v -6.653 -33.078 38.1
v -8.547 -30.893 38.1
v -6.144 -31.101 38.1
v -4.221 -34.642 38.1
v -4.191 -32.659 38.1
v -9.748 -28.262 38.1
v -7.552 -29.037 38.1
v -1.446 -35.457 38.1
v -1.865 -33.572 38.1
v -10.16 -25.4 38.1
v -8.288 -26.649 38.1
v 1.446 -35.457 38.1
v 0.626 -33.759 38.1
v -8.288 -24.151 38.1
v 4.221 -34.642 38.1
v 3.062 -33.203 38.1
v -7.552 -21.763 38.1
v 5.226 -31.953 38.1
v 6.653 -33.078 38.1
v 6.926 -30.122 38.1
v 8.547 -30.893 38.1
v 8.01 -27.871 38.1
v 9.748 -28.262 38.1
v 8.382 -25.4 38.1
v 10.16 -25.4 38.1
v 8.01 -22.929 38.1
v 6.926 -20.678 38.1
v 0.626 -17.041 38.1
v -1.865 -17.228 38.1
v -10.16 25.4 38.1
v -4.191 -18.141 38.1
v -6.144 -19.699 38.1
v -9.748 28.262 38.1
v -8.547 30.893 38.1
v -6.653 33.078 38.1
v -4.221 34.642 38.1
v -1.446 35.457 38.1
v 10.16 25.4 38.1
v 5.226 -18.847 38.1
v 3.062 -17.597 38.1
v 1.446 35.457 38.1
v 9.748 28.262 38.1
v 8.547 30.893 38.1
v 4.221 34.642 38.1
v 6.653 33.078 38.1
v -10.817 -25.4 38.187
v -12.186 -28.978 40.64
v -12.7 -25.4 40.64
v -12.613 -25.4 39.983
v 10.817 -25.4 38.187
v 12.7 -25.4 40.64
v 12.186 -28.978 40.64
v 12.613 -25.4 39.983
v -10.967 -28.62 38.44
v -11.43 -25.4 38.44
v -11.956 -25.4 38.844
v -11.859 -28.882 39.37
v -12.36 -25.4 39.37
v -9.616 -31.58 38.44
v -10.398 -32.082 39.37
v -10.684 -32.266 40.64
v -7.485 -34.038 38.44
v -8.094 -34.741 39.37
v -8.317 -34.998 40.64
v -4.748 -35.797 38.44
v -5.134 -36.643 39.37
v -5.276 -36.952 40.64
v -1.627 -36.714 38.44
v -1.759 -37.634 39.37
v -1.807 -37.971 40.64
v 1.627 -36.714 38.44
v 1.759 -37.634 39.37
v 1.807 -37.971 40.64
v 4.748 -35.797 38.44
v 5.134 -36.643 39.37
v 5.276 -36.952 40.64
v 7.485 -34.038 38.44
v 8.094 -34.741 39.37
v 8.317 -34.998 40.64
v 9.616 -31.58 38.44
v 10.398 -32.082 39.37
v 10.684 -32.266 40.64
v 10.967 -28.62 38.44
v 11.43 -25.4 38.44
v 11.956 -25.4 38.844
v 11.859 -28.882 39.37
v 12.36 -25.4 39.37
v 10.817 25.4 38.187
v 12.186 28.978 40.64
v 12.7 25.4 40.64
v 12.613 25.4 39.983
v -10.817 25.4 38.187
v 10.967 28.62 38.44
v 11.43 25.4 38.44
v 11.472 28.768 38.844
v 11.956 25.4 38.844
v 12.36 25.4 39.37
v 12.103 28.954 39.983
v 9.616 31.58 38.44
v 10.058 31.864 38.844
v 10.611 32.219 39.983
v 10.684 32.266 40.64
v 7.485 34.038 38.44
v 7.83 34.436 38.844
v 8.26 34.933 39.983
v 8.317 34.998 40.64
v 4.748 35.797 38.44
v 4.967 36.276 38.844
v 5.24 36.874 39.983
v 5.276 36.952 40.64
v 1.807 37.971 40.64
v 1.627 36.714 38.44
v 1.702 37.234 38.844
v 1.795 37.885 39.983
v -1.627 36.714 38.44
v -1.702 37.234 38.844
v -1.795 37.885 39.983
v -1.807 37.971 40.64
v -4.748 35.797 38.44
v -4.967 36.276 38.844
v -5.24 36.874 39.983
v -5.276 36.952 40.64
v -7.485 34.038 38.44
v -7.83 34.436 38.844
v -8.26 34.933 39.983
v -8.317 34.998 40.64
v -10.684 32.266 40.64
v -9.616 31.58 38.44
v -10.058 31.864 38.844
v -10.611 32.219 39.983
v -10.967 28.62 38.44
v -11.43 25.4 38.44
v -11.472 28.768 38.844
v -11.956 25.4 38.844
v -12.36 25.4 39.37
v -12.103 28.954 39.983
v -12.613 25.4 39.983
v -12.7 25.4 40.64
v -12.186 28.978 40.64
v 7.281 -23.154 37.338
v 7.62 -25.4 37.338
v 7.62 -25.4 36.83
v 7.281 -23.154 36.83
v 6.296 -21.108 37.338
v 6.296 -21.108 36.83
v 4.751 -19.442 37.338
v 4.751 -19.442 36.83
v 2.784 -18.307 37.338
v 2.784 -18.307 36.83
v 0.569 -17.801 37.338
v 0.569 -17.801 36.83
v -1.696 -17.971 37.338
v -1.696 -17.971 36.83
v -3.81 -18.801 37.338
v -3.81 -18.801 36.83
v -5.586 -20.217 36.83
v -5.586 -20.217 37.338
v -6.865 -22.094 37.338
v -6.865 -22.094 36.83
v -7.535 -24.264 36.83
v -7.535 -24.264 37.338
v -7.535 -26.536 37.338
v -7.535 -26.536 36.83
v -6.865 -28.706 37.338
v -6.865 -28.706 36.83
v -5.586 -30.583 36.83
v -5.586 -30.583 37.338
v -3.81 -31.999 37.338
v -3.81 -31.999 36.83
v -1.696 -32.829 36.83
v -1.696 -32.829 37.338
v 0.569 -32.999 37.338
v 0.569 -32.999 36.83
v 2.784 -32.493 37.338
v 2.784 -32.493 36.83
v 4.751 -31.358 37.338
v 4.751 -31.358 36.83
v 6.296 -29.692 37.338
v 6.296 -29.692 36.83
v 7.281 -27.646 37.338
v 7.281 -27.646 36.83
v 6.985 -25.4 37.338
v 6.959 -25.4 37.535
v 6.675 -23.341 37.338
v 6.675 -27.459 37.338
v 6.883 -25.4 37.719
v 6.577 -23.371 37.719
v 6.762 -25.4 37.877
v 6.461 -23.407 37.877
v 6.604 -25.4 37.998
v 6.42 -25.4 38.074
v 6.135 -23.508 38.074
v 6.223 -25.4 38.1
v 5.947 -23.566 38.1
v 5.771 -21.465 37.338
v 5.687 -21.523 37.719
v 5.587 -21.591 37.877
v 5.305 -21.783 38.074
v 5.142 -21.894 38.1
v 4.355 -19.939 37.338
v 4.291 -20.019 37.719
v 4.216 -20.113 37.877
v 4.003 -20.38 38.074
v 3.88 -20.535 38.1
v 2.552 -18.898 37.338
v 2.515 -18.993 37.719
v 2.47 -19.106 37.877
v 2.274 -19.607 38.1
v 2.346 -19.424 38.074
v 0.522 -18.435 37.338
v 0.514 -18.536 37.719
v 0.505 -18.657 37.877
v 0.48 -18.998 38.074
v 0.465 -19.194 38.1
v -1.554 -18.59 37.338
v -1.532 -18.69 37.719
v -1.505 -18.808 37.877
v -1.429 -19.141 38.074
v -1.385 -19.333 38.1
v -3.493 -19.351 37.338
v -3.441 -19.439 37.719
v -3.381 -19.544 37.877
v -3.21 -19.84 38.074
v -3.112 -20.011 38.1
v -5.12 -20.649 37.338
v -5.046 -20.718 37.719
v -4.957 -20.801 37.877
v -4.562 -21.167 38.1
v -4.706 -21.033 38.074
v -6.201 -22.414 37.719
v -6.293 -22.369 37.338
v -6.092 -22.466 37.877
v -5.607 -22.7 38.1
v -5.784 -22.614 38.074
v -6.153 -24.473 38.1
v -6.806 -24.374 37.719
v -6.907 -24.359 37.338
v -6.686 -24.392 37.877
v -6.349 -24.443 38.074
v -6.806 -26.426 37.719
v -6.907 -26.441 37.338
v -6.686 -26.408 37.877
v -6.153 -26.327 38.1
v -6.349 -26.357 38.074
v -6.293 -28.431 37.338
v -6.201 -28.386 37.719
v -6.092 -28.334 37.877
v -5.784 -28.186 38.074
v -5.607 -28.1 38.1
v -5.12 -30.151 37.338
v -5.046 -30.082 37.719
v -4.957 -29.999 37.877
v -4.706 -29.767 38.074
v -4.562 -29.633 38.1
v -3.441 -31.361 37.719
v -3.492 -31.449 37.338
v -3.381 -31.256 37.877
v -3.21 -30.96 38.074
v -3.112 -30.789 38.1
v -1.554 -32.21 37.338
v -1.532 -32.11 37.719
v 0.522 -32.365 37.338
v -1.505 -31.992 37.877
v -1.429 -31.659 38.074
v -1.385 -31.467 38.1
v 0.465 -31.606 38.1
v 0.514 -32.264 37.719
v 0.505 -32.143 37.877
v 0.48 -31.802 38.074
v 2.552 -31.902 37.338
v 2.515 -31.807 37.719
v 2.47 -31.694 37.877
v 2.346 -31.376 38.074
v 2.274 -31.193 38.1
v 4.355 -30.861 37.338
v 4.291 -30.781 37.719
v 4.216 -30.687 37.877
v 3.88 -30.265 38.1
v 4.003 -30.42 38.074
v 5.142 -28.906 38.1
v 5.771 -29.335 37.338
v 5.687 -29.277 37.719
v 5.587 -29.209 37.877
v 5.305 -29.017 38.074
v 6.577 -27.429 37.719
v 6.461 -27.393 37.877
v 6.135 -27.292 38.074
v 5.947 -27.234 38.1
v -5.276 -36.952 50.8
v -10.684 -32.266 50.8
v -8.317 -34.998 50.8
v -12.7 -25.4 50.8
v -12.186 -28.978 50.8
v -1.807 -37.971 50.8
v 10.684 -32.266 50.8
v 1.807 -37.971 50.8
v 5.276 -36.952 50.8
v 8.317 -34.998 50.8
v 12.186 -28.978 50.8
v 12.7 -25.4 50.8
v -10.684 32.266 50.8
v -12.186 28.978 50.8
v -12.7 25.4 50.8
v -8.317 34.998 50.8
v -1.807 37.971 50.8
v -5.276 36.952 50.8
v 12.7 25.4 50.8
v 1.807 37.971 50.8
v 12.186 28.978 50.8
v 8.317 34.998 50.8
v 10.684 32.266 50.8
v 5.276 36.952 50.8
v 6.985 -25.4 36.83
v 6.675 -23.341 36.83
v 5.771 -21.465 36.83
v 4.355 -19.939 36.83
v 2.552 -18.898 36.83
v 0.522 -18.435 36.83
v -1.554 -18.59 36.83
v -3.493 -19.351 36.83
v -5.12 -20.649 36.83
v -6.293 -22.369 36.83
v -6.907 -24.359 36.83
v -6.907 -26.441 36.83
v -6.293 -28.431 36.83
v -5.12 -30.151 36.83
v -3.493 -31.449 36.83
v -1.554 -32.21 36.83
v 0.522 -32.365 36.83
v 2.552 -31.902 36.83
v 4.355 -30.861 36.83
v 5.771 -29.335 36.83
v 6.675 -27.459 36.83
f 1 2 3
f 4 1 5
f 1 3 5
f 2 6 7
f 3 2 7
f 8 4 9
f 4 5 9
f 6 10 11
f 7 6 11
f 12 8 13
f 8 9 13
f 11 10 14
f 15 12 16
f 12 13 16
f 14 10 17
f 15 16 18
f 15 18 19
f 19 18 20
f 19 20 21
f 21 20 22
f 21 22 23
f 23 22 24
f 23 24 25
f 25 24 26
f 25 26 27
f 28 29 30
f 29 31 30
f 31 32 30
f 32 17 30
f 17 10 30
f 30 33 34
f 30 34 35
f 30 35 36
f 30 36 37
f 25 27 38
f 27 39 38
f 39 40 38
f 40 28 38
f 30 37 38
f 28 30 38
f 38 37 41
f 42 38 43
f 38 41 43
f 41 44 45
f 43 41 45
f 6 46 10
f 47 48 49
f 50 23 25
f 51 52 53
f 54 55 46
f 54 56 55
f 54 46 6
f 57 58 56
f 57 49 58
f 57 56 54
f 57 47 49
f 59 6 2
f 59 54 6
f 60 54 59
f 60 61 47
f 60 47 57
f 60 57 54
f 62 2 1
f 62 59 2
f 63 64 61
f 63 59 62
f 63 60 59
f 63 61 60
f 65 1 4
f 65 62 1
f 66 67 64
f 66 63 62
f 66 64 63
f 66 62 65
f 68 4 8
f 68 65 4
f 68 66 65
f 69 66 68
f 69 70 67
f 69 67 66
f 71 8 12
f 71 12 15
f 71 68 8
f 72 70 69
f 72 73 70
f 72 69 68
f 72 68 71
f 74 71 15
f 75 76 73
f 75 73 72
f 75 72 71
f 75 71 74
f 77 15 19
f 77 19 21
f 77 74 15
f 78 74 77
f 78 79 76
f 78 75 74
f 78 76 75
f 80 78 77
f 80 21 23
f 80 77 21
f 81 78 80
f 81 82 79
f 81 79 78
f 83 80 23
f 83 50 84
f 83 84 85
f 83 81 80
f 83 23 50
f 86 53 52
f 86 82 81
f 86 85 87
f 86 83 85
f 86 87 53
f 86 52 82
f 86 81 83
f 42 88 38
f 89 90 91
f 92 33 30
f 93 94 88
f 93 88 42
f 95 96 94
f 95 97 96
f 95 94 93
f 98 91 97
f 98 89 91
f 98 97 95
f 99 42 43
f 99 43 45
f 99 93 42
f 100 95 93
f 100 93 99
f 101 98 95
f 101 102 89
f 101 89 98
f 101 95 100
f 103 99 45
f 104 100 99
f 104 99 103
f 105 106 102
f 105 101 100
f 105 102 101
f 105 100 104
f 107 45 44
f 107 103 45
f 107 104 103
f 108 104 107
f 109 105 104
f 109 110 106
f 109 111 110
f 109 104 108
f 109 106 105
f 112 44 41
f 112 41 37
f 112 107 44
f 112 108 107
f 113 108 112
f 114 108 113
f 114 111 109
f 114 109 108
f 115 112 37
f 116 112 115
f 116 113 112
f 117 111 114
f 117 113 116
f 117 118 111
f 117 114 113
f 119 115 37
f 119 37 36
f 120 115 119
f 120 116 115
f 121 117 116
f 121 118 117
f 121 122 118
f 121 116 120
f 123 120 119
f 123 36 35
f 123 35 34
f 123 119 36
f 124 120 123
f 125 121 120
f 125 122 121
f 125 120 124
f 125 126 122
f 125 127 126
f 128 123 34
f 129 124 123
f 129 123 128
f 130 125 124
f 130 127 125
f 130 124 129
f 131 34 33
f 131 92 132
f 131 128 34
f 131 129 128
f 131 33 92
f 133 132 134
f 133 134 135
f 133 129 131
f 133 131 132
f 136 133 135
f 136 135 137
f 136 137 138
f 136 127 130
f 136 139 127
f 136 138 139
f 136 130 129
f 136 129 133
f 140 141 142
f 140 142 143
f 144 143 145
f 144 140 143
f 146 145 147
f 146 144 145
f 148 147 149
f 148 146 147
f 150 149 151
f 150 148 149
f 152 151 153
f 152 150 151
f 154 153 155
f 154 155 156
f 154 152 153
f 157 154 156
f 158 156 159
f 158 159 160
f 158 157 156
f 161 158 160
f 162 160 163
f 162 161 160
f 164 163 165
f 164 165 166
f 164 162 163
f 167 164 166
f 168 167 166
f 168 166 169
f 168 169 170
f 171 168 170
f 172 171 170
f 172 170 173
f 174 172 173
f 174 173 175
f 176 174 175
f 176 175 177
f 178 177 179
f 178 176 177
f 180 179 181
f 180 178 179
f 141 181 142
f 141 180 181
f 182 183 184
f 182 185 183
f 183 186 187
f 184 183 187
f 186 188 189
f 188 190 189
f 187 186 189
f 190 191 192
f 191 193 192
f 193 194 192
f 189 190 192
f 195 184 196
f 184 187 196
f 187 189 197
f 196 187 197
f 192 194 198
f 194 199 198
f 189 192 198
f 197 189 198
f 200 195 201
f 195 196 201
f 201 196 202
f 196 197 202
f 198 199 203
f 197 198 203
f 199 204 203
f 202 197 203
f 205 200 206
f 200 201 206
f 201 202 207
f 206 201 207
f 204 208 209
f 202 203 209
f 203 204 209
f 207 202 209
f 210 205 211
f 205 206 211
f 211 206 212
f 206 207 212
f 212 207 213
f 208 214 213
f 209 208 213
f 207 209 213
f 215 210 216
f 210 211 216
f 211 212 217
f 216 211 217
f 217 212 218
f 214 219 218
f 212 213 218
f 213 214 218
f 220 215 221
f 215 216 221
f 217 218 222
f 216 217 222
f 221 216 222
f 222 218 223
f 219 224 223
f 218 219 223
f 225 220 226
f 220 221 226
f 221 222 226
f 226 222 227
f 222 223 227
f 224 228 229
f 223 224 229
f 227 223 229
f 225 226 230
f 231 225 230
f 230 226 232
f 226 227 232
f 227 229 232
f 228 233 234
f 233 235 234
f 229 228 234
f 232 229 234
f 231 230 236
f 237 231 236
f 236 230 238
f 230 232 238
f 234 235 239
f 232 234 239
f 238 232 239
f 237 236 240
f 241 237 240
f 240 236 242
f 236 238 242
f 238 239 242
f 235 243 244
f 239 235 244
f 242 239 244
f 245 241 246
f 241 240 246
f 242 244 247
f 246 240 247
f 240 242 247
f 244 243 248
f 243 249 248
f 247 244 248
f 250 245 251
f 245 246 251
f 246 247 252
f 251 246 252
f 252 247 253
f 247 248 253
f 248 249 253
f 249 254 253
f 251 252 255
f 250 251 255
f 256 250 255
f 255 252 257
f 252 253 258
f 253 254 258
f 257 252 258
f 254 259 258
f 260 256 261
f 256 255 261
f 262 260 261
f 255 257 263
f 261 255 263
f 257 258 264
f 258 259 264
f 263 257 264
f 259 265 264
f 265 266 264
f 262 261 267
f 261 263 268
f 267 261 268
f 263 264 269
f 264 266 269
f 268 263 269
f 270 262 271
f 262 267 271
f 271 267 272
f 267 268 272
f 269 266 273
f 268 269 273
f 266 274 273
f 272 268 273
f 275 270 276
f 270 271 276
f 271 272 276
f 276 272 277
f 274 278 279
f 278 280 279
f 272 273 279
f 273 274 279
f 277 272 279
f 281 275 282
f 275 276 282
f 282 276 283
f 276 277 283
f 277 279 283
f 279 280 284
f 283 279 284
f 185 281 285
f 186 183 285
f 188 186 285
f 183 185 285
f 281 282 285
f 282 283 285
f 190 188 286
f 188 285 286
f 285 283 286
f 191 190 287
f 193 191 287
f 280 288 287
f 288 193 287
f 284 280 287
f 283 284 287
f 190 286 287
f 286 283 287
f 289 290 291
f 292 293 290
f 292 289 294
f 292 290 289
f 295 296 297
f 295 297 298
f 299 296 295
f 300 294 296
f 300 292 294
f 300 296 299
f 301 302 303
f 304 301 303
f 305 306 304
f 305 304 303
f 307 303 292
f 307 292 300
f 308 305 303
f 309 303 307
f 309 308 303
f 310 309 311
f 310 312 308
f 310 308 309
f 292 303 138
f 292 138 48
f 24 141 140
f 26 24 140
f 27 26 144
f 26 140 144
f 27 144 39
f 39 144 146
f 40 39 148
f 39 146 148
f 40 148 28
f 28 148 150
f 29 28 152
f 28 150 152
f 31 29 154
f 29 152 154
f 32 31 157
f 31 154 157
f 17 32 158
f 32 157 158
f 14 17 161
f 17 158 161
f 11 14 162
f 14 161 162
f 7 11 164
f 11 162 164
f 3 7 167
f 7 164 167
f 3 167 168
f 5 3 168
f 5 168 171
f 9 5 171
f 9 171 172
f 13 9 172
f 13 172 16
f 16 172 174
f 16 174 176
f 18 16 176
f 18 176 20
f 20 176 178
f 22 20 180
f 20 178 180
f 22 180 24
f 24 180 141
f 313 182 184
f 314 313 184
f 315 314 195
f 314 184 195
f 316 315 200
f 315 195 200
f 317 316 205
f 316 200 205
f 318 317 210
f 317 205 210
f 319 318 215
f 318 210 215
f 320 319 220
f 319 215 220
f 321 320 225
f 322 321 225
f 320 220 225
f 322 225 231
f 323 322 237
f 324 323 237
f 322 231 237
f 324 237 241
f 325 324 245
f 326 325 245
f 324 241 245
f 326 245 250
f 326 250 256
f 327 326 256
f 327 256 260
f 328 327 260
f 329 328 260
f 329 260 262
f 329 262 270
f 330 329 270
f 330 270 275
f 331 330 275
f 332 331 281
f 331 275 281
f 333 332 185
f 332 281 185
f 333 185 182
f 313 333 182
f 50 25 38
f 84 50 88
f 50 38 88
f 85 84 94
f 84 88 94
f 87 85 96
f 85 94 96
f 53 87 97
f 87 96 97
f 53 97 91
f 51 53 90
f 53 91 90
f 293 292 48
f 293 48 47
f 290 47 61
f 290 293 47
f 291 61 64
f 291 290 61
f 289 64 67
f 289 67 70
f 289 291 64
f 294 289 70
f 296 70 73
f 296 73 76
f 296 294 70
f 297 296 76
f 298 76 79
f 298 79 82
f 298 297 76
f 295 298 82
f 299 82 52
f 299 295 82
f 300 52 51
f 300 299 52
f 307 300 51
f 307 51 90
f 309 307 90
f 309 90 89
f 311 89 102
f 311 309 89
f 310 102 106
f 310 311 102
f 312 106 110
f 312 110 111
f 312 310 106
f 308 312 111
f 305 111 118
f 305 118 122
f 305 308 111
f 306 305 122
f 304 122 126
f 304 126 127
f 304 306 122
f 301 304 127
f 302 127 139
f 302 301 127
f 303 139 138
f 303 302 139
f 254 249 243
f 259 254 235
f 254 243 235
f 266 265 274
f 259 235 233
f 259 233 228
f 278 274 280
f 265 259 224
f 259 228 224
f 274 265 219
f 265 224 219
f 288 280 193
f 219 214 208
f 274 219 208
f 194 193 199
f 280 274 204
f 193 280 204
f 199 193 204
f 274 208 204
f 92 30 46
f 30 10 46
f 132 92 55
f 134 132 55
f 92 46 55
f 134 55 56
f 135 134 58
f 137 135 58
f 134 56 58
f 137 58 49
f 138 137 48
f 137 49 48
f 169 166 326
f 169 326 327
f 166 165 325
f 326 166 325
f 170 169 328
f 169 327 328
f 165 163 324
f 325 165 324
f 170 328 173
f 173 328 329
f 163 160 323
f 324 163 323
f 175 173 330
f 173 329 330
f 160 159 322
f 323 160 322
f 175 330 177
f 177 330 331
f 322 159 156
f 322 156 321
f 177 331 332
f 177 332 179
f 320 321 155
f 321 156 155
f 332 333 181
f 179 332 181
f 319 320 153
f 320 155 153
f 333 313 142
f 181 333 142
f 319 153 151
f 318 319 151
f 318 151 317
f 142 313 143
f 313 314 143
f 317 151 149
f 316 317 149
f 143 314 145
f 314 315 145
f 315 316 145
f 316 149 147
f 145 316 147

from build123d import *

# Parameters (mm, degrees)
F0_W     = 101.6
F0_H     = 101.6
F1_DEPTH = 50.8
F3_DEPTH = 12.7
F4_R     = 7.62
F4_R_2   = 6.985
F5_DEPTH = 1.27
F6_SIZE  = 0.762
F7_R     = 0.762
F9_DEPTH = 25.4
F10_R    = 2.54


with BuildPart() as f1:
    # F0 (on Top) → F1 (new body)
    with BuildSketch(Plane.XY):
        Rectangle(F0_W, F0_H)
    extrude(amount=F1_DEPTH)

    # F2 (on face) → F3 (cut)
    with BuildSketch(Plane.XY.offset(50.8)):
        with BuildLine():
            Line((-12.7, 25.4), (12.7, 25.4))
            ThreePointArc((12.7, 25.4), (0, 38.1), (-12.7, 25.4))
        make_face()
        with BuildLine():
            ThreePointArc((-12.7, 25.4), (0, 12.7), (12.7, 25.4))
            Line((12.7, 25.4), (-12.7, 25.4))
        make_face()
        with BuildLine():
            ThreePointArc((-12.7, -25.4), (0, -12.7), (12.7, -25.4))
            Line((12.7, -25.4), (12.7, 25.4))
            ThreePointArc((12.7, 25.4), (0, 12.7), (-12.7, 25.4))
            Line((-12.7, 25.4), (-12.7, -25.4))
        make_face()
        with BuildLine():
            Line((-12.7, -25.4), (12.7, -25.4))
            ThreePointArc((12.7, -25.4), (0, -12.7), (-12.7, -25.4))
        make_face()
        with BuildLine():
            ThreePointArc((-12.7, -25.4), (0, -38.1), (12.7, -25.4))
            Line((12.7, -25.4), (-12.7, -25.4))
        make_face()
    extrude(amount=-F3_DEPTH, mode=Mode.SUBTRACT)

    # F4 (on face) → F5 (cut)
    with BuildSketch(Plane.XY.offset(38.1)):
        with Locations((0, -25.4)):
            Circle(F4_R)
        with Locations((0, -25.4)):
            Circle(F4_R_2, mode=Mode.SUBTRACT)
    extrude(amount=-F5_DEPTH, mode=Mode.SUBTRACT)

    # F6
    f6_edges = [f1.edges().sort_by_distance(p)[0] for p in [
        (-7.62, -25.4, 38.1),
        (0, -50.8, 0),
    ]]
    chamfer(f6_edges, length=F6_SIZE)

    # F7
    f7_edges = [f1.edges().sort_by_distance(p)[0] for p in [
        (-6.985, -25.4, 38.1),
    ]]
    fillet(f7_edges, radius=F7_R)

    # F10
    f10_edges = [f1.edges().sort_by_distance(p)[0] for p in [
        (0, -38.1, 38.1),
    ]]
    fillet(f10_edges, radius=F10_R)


with BuildPart() as f9:
    # F8 (on face) → F9 (new body)
    with BuildSketch(Plane.XY.offset(50.8)):
        with BuildLine():
            ThreePointArc((-12.7, -25.4), (0, -38.1), (12.7, -25.4))
            Line((12.7, -25.4), (12.7, 25.4))
            ThreePointArc((12.7, 25.4), (0, 38.1), (-12.7, 25.4))
            Line((-12.7, 25.4), (-12.7, -25.4))
        make_face()
    extrude(amount=-F9_DEPTH)

    # F11: cut F1
    add(f1.part, mode=Mode.SUBTRACT)


solid = f9.part
